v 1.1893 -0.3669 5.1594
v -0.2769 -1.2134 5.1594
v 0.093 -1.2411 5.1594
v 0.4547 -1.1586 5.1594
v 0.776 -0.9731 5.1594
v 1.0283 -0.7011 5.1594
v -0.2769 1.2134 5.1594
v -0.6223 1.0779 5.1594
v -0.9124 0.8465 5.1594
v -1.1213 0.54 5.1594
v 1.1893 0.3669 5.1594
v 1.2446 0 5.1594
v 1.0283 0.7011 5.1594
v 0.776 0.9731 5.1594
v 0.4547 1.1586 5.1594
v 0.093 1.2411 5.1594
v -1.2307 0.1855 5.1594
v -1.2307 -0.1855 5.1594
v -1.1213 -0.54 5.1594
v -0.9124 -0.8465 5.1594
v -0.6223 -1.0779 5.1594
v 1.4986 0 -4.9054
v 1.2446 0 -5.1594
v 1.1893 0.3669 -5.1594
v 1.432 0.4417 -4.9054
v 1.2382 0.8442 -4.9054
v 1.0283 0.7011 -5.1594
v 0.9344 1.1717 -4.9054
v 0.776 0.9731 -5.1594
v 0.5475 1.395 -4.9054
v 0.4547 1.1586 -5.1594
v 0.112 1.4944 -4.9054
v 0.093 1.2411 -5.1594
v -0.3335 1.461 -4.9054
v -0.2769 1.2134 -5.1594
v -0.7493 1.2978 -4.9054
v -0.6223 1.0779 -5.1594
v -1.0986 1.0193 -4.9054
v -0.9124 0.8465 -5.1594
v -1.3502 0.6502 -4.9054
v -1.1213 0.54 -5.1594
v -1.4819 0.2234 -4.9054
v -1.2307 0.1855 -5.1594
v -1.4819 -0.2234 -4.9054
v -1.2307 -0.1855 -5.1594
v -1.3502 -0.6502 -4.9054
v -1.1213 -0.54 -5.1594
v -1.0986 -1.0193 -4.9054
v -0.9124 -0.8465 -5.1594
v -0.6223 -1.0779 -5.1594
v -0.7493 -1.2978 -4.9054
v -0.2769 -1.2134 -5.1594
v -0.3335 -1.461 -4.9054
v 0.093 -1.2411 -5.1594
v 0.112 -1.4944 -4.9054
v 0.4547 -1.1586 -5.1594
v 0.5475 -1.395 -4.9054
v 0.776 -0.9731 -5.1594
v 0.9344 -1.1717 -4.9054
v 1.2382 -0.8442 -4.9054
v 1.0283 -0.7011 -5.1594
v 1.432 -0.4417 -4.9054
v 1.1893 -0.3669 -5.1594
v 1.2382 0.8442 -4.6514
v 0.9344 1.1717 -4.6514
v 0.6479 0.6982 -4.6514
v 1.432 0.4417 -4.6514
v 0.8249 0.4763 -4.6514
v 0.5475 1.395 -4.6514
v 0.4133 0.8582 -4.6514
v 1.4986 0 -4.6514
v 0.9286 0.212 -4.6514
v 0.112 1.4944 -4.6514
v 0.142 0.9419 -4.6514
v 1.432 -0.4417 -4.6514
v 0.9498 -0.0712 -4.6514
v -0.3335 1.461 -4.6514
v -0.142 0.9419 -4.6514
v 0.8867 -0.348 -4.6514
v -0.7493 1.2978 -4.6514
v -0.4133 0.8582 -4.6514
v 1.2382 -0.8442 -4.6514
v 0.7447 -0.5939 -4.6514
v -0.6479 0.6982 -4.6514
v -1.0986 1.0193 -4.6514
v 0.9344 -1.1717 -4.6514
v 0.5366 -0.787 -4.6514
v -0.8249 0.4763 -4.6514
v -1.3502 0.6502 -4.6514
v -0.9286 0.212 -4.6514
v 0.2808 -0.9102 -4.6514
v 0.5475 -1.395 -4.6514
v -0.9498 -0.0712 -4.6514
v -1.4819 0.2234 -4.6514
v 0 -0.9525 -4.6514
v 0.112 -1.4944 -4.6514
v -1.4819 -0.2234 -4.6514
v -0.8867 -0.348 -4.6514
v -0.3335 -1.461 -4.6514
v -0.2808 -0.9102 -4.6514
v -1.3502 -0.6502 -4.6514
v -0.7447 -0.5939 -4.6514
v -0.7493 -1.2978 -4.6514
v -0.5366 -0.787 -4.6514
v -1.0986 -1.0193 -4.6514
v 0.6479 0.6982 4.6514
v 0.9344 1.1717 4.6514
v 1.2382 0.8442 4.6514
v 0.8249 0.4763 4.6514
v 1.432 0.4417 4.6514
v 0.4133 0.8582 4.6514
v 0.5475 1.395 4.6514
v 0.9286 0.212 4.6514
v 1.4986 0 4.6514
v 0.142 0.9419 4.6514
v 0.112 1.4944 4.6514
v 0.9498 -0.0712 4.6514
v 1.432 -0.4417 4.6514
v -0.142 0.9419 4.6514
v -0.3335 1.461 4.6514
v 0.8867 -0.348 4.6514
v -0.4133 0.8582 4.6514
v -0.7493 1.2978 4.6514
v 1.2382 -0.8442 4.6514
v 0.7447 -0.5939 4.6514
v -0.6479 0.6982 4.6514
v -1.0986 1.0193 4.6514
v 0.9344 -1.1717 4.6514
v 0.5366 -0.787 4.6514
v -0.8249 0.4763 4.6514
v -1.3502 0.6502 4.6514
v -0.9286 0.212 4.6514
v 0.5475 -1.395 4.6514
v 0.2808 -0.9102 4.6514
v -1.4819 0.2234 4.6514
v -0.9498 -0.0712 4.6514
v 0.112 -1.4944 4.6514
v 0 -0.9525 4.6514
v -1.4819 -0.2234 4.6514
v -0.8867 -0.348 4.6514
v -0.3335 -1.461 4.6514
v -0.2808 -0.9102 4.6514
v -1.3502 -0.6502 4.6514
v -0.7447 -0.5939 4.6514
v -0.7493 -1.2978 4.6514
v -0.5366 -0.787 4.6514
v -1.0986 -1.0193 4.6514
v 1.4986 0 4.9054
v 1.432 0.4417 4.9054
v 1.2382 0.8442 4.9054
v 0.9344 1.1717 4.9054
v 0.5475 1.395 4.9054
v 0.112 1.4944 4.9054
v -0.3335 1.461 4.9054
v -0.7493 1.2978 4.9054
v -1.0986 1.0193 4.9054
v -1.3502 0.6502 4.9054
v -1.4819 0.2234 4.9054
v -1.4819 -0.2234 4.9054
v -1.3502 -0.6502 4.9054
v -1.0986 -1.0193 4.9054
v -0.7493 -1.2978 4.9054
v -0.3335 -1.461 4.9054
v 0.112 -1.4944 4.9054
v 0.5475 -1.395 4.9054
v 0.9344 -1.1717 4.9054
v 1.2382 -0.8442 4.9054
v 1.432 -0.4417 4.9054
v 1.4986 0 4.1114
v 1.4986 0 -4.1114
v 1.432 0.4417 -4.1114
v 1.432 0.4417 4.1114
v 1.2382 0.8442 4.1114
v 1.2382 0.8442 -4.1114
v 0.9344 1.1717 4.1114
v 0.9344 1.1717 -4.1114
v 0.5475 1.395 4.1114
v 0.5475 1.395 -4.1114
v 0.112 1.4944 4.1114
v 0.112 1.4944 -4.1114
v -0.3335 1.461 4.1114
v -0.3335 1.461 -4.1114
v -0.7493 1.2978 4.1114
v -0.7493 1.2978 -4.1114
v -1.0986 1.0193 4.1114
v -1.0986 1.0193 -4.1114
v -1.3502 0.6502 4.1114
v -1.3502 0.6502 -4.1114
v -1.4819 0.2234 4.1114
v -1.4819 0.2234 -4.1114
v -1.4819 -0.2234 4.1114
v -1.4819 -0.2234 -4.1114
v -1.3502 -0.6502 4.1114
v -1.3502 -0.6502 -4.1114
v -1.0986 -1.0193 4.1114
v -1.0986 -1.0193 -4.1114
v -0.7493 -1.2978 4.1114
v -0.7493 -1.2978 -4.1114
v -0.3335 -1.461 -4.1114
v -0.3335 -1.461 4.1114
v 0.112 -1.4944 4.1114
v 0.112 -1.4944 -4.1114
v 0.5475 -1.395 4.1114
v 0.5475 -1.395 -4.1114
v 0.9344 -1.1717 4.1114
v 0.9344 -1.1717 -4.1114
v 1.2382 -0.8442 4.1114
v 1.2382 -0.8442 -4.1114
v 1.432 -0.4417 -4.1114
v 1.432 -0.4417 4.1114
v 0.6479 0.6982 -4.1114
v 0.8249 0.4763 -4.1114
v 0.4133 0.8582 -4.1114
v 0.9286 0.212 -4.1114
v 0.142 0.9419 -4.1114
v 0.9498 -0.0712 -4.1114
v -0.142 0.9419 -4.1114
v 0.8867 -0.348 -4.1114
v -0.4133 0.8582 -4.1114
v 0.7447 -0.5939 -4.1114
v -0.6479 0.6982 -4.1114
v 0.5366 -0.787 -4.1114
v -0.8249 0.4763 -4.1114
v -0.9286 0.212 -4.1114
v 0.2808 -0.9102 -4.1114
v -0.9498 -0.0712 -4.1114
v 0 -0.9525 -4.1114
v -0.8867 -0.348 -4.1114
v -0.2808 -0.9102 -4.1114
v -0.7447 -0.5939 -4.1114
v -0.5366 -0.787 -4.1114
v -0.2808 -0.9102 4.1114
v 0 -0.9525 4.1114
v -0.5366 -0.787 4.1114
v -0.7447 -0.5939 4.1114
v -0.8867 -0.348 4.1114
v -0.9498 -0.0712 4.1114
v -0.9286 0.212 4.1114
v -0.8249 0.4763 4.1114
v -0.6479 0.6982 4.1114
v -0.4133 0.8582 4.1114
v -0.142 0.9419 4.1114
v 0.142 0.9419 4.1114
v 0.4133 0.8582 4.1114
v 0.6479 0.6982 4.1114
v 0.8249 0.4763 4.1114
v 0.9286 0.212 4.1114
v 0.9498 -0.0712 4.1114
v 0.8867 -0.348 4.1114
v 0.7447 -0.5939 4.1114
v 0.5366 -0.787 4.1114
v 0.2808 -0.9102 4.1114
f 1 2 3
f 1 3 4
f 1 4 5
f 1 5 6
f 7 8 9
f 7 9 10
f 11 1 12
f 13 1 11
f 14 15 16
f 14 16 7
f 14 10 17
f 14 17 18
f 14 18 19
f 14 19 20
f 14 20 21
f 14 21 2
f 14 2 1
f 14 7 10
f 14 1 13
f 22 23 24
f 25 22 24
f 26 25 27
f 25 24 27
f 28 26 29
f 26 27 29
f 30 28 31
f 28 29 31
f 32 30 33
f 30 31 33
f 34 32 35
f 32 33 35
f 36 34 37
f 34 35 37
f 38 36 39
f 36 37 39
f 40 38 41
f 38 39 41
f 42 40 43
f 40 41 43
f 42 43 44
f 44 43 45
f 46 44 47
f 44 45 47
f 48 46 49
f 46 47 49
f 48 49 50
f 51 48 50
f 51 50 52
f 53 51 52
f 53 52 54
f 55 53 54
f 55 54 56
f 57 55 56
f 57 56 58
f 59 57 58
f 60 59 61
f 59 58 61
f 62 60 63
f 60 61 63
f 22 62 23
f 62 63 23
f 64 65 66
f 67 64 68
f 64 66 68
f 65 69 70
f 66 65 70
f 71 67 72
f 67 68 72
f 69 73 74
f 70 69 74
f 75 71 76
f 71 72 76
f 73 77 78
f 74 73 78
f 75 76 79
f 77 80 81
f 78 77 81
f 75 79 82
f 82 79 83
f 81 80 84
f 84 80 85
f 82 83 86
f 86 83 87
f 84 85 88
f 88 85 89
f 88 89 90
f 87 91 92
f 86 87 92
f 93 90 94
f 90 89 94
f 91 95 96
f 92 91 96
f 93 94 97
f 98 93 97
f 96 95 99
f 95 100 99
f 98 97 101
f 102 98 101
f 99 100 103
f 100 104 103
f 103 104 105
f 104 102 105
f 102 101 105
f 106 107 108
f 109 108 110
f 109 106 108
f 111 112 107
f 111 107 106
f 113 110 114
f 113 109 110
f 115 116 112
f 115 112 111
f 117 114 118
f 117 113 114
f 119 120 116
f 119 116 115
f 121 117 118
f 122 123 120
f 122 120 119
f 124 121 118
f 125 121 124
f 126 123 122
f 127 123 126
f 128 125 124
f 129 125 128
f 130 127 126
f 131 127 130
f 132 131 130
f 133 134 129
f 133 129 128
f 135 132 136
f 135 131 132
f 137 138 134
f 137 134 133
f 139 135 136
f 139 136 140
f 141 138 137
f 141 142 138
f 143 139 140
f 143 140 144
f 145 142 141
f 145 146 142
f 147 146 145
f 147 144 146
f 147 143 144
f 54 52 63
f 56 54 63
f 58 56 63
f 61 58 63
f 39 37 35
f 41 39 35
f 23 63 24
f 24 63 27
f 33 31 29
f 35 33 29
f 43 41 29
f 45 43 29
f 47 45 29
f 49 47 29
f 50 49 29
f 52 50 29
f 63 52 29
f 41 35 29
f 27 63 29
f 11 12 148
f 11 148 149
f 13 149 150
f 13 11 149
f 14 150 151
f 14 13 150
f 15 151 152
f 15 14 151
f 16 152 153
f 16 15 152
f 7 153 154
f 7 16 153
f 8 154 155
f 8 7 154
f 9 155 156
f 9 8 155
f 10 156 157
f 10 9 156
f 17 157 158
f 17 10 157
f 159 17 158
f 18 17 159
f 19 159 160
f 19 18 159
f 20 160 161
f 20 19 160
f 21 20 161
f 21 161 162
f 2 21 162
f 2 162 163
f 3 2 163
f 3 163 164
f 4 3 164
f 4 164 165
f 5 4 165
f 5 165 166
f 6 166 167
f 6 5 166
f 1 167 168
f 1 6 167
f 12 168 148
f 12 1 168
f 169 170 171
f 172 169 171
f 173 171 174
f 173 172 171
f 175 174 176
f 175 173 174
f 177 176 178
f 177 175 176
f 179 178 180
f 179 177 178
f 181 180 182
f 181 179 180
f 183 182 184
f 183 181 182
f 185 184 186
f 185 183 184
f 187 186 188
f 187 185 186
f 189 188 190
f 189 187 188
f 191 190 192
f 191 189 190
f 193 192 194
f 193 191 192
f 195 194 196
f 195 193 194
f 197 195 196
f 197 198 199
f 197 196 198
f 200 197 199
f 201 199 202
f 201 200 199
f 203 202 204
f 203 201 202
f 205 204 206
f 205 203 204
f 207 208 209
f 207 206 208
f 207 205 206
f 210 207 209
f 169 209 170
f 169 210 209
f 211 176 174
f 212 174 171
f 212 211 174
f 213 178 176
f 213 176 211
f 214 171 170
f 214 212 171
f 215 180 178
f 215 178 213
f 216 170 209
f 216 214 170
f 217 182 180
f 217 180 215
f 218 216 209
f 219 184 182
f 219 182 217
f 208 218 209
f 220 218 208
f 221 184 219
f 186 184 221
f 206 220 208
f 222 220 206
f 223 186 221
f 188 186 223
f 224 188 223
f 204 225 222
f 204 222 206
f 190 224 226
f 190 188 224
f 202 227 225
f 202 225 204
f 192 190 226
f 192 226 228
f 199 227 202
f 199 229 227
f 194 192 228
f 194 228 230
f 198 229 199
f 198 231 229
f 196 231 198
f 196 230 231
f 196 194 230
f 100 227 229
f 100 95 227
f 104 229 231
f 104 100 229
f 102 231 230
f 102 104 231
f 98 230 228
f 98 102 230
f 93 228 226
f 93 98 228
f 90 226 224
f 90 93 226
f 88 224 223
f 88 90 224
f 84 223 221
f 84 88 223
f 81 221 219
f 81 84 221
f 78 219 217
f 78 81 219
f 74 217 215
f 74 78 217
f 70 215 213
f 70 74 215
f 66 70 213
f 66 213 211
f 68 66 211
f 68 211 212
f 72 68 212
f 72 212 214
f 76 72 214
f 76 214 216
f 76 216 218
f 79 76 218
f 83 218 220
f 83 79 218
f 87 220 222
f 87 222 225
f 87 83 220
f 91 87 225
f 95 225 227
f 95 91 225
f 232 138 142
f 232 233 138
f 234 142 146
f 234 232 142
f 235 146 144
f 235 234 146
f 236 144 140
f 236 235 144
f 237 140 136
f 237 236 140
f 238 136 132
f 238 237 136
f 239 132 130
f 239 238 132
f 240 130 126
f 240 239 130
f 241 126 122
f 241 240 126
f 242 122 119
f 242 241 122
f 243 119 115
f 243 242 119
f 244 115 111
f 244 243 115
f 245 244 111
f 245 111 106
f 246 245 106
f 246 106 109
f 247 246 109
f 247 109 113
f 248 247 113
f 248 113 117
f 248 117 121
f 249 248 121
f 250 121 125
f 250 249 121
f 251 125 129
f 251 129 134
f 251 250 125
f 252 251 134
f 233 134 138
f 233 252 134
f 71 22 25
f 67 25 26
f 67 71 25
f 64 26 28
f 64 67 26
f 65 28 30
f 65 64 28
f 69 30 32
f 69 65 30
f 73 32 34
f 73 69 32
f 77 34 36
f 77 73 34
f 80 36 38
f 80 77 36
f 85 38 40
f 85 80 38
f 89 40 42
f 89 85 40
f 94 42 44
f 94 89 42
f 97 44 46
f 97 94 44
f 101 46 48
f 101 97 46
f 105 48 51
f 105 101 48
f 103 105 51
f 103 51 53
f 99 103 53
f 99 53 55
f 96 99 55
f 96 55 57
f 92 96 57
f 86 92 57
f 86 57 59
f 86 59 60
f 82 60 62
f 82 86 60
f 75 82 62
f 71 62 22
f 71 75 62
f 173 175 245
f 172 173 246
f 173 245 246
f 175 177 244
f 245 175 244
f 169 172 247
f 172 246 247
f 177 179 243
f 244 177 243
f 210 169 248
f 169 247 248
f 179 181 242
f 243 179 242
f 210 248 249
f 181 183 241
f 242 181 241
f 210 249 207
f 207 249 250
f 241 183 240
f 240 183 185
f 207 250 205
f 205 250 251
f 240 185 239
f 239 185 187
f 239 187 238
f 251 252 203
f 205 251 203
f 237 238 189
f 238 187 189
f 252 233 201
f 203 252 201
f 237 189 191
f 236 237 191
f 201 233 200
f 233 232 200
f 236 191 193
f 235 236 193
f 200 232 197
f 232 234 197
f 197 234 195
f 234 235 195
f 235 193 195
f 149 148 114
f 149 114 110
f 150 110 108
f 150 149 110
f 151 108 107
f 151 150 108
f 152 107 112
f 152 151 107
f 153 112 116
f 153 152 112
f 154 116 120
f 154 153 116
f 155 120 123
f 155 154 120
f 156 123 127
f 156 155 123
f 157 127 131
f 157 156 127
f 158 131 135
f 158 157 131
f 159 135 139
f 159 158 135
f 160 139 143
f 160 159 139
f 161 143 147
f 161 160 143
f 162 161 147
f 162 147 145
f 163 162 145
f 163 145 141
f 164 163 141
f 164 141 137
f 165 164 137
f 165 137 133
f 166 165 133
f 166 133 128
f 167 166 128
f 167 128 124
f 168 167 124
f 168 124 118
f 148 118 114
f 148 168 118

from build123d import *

# Parameters (mm, degrees)
SKETCH1_R           = 1.4986
BOSS_EXTRUDE1_DEPTH = 5.159375
SKETCH2_W           = 0.54
SKETCH2_H           = 0.5461
CHAMFER1_SIZE       = 0.254


with BuildPart() as part:
    # Sketch1 → Boss-Extrude1 (new body, symmetric)
    with BuildSketch(Plane.XY):
        Circle(SKETCH1_R)
    extrude(amount=BOSS_EXTRUDE1_DEPTH, both=True)

    # Sketch2 → Cut-Revolve1 (revolve, cut)
    with BuildSketch(Plane(origin=(0, 0, 0), x_dir=(0, 0, -1), z_dir=(1, 0, 0))):
        with Locations((-4.381375, -1.22555)):
            Rectangle(SKETCH2_W, SKETCH2_H)
        with Locations((4.381375, -1.22555)):
            Rectangle(SKETCH2_W, SKETCH2_H)
    revolve(axis=Axis((0, 0, 8.828032455), (0, 0, -1)), mode=Mode.SUBTRACT)

    # Chamfer1
    chamfer1_edges = [part.edges().sort_by_distance(p)[0] for p in [
        (-1.4986, 0, -5.159375),
        (-1.4986, 0, 5.159375),
    ]]
    chamfer(chamfer1_edges, length=CHAMFER1_SIZE)


solid = part.part
